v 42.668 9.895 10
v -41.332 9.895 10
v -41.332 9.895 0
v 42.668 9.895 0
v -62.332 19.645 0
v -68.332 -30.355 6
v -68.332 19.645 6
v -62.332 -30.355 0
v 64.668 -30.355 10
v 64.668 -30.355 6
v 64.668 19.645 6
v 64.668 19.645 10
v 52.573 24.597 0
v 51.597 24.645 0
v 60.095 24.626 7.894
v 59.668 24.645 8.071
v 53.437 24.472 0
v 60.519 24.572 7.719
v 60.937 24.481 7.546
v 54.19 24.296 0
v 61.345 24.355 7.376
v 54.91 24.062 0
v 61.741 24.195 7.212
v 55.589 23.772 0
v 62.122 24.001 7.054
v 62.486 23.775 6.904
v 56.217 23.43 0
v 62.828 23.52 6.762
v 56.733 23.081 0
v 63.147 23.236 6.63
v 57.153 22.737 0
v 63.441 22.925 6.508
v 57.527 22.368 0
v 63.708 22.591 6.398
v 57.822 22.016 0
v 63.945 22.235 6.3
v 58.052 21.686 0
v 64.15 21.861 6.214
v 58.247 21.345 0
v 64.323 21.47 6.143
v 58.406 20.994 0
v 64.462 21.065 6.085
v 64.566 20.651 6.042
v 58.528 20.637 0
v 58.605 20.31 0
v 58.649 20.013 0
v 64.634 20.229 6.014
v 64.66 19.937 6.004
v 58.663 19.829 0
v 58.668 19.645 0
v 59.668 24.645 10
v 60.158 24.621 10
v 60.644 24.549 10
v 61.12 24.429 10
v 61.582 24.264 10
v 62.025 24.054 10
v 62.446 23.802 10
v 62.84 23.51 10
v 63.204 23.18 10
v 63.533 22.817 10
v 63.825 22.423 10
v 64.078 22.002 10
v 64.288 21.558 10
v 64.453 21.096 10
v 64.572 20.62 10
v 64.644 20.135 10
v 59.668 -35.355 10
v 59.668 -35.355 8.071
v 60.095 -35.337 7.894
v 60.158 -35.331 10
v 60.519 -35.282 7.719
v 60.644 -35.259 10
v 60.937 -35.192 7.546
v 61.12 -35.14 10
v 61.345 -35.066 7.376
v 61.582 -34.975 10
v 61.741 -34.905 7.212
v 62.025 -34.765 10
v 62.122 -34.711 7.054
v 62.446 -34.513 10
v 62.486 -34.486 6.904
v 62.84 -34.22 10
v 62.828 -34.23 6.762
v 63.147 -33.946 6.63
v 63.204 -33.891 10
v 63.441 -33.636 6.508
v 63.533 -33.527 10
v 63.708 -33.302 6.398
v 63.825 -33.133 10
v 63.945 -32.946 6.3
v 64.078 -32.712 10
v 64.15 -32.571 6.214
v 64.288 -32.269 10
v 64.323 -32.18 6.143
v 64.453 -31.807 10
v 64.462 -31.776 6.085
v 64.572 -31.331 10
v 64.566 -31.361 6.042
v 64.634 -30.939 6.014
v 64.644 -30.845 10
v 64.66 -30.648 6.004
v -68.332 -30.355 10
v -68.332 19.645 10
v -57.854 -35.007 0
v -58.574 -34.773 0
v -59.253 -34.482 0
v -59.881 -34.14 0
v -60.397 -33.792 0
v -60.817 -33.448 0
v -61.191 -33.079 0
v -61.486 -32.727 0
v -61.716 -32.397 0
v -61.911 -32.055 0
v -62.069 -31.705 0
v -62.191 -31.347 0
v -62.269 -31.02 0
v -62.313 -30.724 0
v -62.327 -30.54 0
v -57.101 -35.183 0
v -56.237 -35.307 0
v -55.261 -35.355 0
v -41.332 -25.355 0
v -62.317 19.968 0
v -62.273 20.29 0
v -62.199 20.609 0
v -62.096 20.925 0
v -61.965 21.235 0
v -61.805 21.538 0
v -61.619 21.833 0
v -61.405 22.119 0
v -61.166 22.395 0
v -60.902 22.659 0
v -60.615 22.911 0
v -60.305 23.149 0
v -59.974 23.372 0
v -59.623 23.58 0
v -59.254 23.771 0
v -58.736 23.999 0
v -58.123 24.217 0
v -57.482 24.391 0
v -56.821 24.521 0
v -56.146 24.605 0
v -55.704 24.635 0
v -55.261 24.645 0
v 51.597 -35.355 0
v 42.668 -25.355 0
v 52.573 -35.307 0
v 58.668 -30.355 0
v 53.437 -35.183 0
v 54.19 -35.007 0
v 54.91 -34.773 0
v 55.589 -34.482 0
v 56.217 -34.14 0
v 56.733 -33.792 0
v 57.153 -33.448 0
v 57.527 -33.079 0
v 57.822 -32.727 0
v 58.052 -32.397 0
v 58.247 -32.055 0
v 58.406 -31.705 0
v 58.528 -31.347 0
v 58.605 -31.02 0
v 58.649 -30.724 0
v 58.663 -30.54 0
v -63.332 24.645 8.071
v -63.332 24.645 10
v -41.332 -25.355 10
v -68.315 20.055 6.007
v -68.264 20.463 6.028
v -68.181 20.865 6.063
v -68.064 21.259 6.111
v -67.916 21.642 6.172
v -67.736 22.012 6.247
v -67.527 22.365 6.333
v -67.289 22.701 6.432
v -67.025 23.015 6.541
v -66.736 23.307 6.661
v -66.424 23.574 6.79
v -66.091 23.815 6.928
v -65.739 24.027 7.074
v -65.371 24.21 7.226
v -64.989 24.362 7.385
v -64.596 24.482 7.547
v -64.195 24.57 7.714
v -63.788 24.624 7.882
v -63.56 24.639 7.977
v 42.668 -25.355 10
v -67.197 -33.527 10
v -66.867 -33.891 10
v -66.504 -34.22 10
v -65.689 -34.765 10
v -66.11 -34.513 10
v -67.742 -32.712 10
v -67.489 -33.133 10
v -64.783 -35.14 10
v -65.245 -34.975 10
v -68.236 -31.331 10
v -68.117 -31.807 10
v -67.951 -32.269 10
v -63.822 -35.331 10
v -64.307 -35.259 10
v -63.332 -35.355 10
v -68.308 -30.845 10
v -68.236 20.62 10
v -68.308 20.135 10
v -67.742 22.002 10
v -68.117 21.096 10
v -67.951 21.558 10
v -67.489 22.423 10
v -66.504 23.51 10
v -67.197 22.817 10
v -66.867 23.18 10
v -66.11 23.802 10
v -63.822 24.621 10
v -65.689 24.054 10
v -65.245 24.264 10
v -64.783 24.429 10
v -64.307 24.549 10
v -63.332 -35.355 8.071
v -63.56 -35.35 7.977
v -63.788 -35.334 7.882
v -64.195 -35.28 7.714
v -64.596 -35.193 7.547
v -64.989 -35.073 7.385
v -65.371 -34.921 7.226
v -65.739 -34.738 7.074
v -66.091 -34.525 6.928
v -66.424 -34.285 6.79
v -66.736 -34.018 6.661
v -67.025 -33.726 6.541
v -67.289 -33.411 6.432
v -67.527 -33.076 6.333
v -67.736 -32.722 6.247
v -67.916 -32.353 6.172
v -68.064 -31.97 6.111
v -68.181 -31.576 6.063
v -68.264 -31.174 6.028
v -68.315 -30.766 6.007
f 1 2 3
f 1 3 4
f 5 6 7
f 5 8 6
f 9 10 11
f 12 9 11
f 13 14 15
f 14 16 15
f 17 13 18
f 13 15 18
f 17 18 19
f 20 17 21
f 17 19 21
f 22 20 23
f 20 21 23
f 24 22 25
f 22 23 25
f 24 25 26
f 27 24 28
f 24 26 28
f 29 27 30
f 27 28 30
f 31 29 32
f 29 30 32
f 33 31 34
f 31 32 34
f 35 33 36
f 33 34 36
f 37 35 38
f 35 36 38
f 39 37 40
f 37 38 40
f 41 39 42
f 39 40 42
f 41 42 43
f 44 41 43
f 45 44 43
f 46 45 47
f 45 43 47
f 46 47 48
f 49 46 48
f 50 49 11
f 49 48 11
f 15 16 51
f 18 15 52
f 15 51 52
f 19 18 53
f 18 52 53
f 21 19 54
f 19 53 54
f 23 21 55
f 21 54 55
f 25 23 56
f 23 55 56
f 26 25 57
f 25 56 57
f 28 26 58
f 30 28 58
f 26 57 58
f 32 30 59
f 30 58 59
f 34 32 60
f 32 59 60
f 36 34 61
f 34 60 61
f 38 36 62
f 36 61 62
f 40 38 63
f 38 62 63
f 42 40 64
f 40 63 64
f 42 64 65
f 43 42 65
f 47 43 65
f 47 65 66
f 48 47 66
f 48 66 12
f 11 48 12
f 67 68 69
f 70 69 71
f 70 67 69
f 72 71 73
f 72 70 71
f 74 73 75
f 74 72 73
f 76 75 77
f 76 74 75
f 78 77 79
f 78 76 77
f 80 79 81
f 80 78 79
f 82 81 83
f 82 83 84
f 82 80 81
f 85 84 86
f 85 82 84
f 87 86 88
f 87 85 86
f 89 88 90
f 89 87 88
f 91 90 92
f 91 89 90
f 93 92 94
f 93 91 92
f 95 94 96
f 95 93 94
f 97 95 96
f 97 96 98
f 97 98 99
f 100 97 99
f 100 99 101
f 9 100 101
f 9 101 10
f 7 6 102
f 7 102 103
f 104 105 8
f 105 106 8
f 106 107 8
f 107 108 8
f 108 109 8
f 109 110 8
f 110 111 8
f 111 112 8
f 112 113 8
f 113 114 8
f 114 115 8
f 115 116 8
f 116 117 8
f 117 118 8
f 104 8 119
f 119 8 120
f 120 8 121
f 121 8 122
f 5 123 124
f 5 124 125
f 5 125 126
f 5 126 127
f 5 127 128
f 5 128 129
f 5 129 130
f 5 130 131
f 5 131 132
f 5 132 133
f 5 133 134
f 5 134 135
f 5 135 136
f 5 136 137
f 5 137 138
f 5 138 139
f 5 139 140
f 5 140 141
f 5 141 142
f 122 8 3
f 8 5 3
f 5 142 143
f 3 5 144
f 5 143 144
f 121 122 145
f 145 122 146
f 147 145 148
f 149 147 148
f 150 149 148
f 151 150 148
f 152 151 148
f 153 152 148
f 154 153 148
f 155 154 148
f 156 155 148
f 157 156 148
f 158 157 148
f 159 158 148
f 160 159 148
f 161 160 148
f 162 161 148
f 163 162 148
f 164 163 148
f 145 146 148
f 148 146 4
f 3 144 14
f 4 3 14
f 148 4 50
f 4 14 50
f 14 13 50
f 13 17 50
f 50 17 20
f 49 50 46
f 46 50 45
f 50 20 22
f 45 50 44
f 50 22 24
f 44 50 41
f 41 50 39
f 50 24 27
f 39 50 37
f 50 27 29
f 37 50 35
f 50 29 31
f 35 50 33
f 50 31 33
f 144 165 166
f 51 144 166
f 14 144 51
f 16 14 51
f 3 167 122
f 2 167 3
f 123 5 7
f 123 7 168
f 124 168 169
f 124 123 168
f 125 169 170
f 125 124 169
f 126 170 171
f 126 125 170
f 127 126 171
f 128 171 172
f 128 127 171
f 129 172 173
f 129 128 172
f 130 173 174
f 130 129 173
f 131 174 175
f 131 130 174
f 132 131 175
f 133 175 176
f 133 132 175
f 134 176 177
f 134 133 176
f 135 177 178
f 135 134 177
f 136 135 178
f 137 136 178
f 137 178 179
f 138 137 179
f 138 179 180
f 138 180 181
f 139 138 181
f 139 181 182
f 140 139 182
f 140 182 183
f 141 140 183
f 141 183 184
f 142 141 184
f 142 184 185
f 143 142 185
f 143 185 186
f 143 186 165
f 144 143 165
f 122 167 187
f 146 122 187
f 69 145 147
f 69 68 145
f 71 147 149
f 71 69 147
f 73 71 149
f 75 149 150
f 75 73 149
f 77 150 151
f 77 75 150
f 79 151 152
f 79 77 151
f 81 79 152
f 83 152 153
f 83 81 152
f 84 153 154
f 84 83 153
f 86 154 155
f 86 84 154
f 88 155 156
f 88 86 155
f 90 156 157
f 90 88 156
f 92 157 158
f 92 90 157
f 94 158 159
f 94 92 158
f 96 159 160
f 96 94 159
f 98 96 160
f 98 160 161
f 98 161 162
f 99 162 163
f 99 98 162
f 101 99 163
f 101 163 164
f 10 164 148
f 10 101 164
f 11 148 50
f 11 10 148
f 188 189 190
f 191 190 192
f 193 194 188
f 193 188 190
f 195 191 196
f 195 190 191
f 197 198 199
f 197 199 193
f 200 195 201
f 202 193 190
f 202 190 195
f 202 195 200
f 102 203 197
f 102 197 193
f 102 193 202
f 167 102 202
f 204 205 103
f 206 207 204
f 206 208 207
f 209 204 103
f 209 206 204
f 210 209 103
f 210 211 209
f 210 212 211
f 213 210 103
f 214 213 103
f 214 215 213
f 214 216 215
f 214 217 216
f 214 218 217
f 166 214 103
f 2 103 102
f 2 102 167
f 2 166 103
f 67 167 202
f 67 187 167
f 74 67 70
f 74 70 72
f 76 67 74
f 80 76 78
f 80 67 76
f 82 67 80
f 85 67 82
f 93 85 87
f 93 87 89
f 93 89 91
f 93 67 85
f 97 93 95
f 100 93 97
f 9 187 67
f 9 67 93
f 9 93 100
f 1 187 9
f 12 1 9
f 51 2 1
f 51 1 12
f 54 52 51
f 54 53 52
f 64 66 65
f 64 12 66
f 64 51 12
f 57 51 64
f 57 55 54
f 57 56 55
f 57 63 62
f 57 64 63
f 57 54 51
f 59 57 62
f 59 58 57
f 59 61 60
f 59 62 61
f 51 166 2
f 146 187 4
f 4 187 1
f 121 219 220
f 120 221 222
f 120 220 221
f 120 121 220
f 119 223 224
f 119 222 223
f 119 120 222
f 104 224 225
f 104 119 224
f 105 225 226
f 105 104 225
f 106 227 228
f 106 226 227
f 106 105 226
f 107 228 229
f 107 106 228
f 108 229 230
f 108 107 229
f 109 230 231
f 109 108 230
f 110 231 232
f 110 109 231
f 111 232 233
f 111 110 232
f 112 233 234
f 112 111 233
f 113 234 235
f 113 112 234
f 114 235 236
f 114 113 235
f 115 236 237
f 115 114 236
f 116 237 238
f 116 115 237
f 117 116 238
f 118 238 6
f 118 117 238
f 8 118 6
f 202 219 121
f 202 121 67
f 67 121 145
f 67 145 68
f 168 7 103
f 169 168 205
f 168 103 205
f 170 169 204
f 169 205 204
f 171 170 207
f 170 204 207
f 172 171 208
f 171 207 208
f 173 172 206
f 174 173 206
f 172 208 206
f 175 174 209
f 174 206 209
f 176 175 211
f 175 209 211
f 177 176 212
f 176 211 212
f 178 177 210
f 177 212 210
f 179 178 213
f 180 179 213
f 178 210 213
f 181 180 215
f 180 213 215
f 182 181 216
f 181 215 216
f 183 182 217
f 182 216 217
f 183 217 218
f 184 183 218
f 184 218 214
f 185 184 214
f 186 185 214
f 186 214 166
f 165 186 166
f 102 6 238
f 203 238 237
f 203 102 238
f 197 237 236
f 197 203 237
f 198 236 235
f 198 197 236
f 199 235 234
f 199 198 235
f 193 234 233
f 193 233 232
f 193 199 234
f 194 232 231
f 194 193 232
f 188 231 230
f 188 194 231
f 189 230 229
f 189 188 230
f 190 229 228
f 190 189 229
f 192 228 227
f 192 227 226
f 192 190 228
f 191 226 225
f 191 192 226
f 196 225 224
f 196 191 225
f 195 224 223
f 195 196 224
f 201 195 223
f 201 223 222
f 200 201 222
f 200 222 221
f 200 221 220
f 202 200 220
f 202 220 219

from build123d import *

# Parameters (mm, degrees)
F0_W     = 133
F0_H     = 60
F1_DEPTH = 10
F2_W     = 84
F2_H     = 35.25
F3_DEPTH = 10.001
F4_SIZE  = 6
F5_R     = 5


with BuildPart() as f1:
    # F0 (on Top) → F1 (new body)
    with BuildSketch(Plane.XY):
        with Locations((-1.8318939209, -5.355308602)):
            Rectangle(F0_W, F0_H)
    extrude(amount=F1_DEPTH)

    # F2 (on face) → F3 (cut, through all)
    with BuildSketch(Plane.XY.offset(10)):
        with Locations((0.6681060791, -7.730308602)):
            Rectangle(F2_W, F2_H)
    extrude(amount=-F3_DEPTH, mode=Mode.SUBTRACT)

    # F4
    f4_edges = [f1.edges().sort_by_distance(p)[0] for p in [
        (64.668106, -5.355309, 0),
        (-68.331894, -5.355309, 0),
    ]]
    chamfer(f4_edges, length=F4_SIZE)

    # F5
    f5_edges = [f1.edges().sort_by_distance(p)[0] for p in [
        (-68.331894, -35.355309, 8),
        (-65.331894, -35.355309, 3),
        (-68.331894, 24.644691, 8),
        (-65.331894, 24.644691, 3),
        (64.668106, 24.644691, 8),
        (61.668106, 24.644691, 3),
        (64.668106, -35.355309, 8),
        (61.668106, -35.355309, 3),
    ]]
    fillet(f5_edges, radius=F5_R)


solid = f1.part
